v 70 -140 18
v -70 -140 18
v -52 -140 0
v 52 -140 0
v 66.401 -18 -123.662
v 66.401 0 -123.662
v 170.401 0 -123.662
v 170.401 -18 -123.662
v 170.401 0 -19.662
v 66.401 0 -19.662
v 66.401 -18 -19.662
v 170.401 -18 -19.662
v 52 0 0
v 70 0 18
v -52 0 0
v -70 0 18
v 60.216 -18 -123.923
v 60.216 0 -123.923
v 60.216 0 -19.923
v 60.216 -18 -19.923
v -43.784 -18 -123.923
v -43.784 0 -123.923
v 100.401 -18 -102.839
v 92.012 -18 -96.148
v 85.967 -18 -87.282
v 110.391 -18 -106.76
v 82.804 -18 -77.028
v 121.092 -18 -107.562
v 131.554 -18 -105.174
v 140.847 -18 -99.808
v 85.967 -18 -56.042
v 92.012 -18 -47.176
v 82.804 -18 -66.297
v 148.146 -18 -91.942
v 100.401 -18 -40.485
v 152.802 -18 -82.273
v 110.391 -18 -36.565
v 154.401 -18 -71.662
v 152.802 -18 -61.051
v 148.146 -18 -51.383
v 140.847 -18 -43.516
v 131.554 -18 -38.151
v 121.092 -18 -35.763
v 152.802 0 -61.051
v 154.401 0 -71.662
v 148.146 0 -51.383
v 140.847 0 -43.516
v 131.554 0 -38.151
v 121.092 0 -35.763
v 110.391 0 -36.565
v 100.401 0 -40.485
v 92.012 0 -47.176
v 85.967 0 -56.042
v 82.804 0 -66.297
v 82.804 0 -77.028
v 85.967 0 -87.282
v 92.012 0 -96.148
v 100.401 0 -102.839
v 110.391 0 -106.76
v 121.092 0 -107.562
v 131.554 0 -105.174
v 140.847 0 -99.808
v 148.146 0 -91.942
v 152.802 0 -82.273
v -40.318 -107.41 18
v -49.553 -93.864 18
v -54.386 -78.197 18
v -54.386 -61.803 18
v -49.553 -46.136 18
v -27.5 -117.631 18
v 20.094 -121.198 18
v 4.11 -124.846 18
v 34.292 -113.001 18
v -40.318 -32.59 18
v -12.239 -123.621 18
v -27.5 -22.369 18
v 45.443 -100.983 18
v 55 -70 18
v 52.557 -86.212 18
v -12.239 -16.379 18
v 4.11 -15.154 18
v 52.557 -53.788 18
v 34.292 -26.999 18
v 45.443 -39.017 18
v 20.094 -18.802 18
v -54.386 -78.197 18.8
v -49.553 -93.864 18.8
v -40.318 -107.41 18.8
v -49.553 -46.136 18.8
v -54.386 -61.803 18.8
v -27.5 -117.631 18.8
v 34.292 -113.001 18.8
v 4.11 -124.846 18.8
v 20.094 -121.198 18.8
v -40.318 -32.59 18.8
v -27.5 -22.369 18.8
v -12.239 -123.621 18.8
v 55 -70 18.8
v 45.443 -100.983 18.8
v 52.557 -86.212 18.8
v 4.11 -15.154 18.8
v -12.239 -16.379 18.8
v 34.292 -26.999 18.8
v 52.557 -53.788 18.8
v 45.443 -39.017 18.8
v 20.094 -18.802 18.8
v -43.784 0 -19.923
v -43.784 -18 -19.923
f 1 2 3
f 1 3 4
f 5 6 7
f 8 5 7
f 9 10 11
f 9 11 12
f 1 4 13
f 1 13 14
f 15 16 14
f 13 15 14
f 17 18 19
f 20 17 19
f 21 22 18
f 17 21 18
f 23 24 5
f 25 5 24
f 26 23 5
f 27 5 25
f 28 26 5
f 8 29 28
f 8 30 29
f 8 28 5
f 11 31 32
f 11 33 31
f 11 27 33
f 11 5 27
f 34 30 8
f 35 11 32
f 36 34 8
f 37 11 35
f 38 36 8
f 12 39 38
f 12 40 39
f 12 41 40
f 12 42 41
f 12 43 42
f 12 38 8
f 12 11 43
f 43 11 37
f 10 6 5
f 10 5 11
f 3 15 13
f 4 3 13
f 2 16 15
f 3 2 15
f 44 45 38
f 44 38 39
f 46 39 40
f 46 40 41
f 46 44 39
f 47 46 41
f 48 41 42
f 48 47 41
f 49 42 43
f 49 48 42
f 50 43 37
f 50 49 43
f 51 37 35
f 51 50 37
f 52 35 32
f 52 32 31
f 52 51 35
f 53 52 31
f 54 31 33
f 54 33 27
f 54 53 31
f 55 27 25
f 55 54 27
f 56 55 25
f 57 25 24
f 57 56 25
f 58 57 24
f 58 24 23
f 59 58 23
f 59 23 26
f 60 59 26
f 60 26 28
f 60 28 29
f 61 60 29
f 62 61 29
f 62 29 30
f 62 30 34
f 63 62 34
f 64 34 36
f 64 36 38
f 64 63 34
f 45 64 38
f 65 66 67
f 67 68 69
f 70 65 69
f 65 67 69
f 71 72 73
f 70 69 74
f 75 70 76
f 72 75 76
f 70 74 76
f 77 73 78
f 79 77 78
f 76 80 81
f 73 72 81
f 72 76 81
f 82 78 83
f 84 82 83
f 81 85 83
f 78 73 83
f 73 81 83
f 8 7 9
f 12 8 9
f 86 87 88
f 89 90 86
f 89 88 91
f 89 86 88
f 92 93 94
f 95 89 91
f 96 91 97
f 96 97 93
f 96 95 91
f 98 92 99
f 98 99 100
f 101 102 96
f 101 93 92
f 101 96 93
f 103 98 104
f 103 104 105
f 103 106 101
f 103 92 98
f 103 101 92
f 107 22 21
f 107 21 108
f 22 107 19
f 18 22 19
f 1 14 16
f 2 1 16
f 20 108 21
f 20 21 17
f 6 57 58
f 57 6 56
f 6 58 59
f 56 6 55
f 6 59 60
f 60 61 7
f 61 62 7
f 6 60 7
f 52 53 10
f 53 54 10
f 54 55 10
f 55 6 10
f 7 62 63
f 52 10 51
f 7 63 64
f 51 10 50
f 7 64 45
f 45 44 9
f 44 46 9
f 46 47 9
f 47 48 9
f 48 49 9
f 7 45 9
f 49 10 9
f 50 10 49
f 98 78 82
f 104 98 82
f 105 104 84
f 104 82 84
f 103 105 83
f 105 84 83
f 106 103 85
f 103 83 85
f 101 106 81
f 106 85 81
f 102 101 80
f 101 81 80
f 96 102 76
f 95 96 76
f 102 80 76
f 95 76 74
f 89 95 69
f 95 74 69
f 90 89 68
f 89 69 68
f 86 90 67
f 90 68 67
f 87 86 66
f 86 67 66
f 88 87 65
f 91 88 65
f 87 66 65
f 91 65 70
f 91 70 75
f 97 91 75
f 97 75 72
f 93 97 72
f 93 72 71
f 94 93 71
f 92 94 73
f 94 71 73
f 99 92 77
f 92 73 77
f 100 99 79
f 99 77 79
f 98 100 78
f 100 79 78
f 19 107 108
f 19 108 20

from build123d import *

# Parameters (mm, degrees)
F1_DEPTH = 140
F2_W     = 104
F2_H     = 104
F3_DEPTH = 18
F4_W     = 104
F4_H     = 104
F4_R     = 36
F5_DEPTH = 18
F6_R     = 55
F7_DEPTH = 0.8


with BuildPart() as f1:
    # F0 (on Front) → F1 (new body)
    with BuildSketch(Plane.XZ):
        Polygon((-70, 18), (-52, 0), (52, 0), (70, 18), align=None)
    extrude(amount=F1_DEPTH)


with BuildPart() as f3:
    # F2 (on Front) → F3 (new body)
    with BuildSketch(Plane.XZ):
        with Locations((8.215694, -71.922896)):
            Rectangle(F2_W, F2_H)
    extrude(amount=F3_DEPTH)


with BuildPart() as f5:
    # F4 (on Front) → F5 (new body)
    with BuildSketch(Plane.XZ):
        with Locations((118.401412, -71.662202)):
            Rectangle(F4_W, F4_H)
        with Locations((118.401412, -71.662202)):
            Circle(F4_R, mode=Mode.SUBTRACT)
    extrude(amount=F5_DEPTH)


with BuildPart() as f7:
    # F6 (on face) → F7 (new body)
    with BuildSketch(Plane.XY.offset(18)):
        with Locations((0, -70)):
            Circle(F6_R)
    extrude(amount=F7_DEPTH)


solid = Compound([f1.part, f3.part, f5.part, f7.part])
